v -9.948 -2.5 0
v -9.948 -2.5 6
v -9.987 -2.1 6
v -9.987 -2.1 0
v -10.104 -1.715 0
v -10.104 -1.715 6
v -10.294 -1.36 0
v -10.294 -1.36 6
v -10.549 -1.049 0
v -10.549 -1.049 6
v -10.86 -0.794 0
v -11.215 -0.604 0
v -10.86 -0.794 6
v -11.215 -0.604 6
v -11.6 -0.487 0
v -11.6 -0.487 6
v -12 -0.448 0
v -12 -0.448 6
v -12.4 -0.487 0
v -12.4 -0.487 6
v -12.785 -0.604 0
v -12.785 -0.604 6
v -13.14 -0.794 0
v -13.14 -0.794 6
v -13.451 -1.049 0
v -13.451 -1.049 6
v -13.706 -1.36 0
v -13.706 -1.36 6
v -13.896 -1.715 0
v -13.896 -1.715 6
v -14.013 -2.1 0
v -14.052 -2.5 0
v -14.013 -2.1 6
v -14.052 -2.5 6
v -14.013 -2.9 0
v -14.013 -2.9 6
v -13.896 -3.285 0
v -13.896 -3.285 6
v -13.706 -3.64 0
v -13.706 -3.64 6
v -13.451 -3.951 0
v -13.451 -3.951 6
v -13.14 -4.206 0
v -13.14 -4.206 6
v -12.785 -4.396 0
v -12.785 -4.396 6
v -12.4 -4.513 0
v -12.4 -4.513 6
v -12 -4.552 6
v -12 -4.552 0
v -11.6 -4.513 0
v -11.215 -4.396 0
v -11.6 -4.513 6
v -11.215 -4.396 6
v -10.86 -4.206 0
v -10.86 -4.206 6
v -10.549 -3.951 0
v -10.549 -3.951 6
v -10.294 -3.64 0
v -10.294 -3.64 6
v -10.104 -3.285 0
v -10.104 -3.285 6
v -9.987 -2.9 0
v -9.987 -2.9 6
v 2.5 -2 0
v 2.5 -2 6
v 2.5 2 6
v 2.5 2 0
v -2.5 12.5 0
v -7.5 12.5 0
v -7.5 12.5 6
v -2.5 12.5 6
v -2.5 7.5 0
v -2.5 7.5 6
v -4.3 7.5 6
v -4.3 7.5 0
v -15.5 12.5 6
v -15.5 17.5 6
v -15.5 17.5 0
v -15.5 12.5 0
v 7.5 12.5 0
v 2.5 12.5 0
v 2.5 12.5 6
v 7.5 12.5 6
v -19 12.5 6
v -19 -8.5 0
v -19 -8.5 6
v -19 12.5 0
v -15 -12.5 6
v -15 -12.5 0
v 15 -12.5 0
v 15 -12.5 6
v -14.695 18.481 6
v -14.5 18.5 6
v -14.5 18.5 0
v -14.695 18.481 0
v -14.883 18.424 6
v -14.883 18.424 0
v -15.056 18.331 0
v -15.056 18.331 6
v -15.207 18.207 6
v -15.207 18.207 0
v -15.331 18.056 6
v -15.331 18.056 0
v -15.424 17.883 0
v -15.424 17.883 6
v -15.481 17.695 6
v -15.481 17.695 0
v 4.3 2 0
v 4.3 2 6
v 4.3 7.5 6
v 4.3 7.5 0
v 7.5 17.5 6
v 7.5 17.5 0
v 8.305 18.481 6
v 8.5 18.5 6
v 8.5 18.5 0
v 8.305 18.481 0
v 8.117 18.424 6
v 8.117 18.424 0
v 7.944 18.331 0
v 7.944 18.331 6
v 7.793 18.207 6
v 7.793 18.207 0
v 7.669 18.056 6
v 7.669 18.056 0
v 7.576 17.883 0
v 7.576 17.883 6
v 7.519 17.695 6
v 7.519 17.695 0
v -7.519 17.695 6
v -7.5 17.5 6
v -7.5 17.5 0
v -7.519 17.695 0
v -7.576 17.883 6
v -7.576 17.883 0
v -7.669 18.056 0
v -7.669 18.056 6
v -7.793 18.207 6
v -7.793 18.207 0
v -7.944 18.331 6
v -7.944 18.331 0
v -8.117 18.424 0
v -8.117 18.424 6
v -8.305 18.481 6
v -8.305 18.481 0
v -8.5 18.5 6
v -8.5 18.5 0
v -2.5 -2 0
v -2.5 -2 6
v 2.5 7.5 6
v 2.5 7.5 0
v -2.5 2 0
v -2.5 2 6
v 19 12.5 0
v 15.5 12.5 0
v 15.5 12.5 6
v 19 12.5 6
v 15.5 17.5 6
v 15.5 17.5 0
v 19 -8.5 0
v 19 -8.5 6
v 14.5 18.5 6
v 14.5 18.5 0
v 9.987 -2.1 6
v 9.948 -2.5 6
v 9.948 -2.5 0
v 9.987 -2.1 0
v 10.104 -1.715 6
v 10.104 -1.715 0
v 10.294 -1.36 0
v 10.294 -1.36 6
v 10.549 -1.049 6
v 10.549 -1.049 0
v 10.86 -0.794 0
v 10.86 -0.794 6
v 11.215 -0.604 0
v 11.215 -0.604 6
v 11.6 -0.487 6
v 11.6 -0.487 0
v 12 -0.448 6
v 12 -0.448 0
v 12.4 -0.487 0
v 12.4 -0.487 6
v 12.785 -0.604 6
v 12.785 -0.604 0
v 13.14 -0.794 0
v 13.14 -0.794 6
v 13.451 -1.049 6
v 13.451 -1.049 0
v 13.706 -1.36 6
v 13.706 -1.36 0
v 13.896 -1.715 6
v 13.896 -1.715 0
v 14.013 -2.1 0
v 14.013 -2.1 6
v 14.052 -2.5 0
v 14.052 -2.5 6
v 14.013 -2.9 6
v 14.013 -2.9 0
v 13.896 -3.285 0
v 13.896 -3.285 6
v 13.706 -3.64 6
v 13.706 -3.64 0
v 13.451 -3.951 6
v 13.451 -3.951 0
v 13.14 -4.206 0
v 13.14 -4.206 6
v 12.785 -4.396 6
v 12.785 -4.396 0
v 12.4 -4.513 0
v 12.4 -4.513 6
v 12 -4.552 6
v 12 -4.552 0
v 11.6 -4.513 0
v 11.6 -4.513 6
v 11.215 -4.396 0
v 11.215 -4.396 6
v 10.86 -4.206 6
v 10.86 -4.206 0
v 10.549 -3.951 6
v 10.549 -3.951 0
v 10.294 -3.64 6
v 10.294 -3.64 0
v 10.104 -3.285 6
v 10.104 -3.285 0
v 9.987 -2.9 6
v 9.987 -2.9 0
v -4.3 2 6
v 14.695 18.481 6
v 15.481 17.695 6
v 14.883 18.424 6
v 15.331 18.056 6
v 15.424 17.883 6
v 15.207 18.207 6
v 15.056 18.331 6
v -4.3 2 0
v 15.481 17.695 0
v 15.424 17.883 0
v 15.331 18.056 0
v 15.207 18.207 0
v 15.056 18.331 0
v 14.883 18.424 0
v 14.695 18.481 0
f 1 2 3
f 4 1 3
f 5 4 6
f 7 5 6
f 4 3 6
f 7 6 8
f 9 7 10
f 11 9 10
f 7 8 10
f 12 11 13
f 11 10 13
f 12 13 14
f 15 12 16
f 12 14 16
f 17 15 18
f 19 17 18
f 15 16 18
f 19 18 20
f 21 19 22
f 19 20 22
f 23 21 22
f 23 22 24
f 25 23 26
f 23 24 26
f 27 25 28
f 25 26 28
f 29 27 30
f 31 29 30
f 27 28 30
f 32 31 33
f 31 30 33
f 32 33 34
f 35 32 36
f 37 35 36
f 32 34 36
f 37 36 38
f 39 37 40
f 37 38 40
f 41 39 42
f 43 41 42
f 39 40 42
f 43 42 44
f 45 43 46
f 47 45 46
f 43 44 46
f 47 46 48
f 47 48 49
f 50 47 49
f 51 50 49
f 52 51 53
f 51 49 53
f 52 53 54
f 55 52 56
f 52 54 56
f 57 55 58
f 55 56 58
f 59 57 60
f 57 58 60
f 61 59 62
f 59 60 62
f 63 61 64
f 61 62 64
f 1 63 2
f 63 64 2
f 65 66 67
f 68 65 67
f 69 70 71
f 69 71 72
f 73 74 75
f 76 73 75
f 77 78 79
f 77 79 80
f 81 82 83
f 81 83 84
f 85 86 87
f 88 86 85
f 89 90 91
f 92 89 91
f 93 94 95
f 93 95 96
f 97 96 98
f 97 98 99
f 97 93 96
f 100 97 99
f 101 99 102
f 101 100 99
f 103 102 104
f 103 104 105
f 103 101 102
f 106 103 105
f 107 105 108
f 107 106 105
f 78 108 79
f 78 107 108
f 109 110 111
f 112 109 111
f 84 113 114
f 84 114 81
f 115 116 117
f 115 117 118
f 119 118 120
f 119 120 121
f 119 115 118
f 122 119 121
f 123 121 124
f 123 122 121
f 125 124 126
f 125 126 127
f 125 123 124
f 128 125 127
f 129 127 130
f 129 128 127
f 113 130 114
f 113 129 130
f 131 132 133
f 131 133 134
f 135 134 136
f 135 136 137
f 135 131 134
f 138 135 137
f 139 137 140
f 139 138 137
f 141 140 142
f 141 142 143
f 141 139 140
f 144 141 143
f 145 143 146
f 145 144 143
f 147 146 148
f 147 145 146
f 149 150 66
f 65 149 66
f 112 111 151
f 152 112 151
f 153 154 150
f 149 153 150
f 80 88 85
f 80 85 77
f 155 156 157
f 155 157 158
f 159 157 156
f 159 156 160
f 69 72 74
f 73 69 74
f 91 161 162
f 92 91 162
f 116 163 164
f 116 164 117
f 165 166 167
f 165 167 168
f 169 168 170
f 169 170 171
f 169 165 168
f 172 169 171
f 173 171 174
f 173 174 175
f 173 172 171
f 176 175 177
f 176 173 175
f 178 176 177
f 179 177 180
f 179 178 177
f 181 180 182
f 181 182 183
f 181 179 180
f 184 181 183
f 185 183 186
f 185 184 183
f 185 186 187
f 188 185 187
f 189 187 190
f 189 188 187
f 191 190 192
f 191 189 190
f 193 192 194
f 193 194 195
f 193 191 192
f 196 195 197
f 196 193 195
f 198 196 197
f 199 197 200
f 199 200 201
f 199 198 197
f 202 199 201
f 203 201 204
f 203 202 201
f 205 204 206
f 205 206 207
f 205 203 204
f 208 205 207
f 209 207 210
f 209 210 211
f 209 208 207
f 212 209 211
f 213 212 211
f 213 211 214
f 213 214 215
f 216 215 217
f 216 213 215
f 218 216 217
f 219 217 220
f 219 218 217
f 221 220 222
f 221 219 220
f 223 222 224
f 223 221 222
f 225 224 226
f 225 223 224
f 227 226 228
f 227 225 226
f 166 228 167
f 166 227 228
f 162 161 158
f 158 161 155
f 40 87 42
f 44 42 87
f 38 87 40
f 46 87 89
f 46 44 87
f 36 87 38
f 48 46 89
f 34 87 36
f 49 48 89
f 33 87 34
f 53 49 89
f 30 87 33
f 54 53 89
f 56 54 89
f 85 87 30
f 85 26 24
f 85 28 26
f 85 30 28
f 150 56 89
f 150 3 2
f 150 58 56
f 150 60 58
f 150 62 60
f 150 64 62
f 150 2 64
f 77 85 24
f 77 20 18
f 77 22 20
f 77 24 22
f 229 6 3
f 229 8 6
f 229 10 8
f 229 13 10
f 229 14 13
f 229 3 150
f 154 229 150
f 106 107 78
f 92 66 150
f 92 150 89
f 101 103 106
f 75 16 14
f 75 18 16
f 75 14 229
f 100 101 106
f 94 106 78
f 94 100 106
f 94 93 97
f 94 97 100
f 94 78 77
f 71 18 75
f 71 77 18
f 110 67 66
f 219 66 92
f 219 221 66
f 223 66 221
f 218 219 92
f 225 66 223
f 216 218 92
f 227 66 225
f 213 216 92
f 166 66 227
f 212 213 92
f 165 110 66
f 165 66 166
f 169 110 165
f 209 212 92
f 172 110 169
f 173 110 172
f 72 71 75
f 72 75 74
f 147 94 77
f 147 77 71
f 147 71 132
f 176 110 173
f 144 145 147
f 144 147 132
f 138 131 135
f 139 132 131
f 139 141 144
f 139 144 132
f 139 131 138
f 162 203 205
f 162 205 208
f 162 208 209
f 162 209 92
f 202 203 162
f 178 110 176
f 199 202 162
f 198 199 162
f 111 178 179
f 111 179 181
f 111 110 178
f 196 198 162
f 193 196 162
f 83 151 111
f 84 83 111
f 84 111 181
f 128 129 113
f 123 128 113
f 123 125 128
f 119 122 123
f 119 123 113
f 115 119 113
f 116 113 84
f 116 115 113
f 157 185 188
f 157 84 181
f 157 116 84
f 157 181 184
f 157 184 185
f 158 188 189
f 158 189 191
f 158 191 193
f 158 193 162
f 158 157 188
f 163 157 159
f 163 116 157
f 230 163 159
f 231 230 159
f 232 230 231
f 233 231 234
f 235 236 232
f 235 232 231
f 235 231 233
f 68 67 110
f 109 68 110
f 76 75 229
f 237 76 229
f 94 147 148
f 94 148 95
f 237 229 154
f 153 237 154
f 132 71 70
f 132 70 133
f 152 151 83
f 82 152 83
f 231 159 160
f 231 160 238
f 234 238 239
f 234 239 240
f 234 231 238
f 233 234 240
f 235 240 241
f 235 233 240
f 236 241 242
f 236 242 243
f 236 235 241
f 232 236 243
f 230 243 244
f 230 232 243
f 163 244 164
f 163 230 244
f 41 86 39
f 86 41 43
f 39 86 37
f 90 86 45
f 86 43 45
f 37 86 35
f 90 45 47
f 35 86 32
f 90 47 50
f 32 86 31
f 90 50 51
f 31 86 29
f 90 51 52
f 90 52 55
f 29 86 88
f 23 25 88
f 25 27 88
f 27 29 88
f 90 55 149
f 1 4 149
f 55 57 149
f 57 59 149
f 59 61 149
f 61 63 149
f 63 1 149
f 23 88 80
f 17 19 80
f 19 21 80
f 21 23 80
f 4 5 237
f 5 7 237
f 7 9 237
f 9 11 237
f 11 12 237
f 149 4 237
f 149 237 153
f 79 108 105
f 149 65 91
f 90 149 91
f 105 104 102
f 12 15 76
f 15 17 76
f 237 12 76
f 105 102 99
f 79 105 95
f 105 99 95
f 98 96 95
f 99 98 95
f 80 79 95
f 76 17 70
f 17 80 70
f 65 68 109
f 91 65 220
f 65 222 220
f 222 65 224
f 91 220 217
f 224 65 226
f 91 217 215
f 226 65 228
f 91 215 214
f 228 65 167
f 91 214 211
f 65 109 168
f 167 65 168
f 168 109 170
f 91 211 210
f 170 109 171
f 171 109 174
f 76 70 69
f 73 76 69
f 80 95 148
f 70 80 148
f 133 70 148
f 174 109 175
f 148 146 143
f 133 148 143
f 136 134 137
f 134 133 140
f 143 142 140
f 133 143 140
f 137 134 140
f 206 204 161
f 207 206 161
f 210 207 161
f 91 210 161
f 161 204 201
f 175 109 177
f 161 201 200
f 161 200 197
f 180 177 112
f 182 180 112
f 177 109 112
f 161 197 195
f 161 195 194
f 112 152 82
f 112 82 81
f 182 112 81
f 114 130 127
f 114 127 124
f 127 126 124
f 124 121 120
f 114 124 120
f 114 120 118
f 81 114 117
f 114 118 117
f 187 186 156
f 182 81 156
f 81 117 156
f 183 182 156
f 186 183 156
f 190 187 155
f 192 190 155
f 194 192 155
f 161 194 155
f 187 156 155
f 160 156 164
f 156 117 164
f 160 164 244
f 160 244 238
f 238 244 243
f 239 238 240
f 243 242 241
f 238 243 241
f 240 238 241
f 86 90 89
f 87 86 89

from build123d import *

# Parameters (mm, degrees)
ESQUISSE1_W             = 38
ESQUISSE1_H             = 25
BOSS_EXTRU_1_DEPTH      = 6
ENL_V_MAT_EXTRU_1_DEPTH = 6
BOSS_EXTRU_2_DEPTH      = 6
ESQUISSE4_R             = 2.052376102
ENL_V_MAT_EXTRU_2_DEPTH = 6
CHANFREIN2_SIZE         = 4


with BuildPart() as part:
    # Esquisse1 → Boss.-Extru.1 (new body)
    with BuildSketch(Plane.XY):
        Rectangle(ESQUISSE1_W, ESQUISSE1_H)
    extrude(amount=BOSS_EXTRU_1_DEPTH)

    # Esquisse2 → Enlèv. mat.-Extru.1 (cut)
    with BuildSketch(Plane.XY.offset(6)):
        Polygon((2.5, 12.5), (-2.5, 12.5), (-2.5, 7.5), (-4.3, 7.5), (-4.3, 2), (-2.5, 2), (-2.5, -2), (2.5, -2), (2.5, 2), (4.3, 2), (4.3, 7.5), (2.5, 7.5), align=None)
    extrude(amount=-ENL_V_MAT_EXTRU_1_DEPTH, mode=Mode.SUBTRACT)

    # Esquisse2<3> → Boss.-Extru.2 (add)
    with BuildSketch(Plane.XY.offset(6)):
        with BuildLine():
            Line((-15.5, 17.5), (-15.5, 12.5))
            Line((-15.5, 12.5), (-7.5, 12.5))
            Line((-7.5, 12.5), (-7.5, 17.5))
            ThreePointArc((-7.5, 17.5), (-7.792893219, 18.207106781), (-8.5, 18.5))
            Line((-8.5, 18.5), (-14.5, 18.5))
            ThreePointArc((-14.5, 18.5), (-15.207106781, 18.207106781), (-15.5, 17.5))
        make_face()
        with BuildLine():
            Line((7.5, 17.5), (7.5, 12.5))
            Line((7.5, 12.5), (15.5, 12.5))
            Line((15.5, 12.5), (15.5, 17.5))
            ThreePointArc((15.5, 17.5), (15.207106781, 18.207106781), (14.5, 18.5))
            Line((14.5, 18.5), (8.5, 18.5))
            ThreePointArc((8.5, 18.5), (7.792893219, 18.207106781), (7.5, 17.5))
        make_face()
    extrude(amount=-BOSS_EXTRU_2_DEPTH)

    # Esquisse4 → Enlèv. mat.-Extru.2 (cut)
    with BuildSketch(Plane.XY.offset(6)):
        with Locations((-12, -2.5)):
            Circle(ESQUISSE4_R)
    enl_v_mat_extru_2 = extrude(amount=-ENL_V_MAT_EXTRU_2_DEPTH, mode=Mode.SUBTRACT)

    # Symétrie7: Enlèv. mat.-Extru.2 across plane
    add(enl_v_mat_extru_2.mirror(Plane(origin=(0, 0, 0), x_dir=(0, 0, 1), z_dir=(1, 0, 0))), mode=Mode.SUBTRACT)

    # Chanfrein2
    chanfrein2_edges = [part.edges().sort_by_distance(p)[0] for p in [
        (19, -12.5, 3),
        (-19, -12.5, 3),
    ]]
    chamfer(chanfrein2_edges, length=CHANFREIN2_SIZE)


solid = part.part
